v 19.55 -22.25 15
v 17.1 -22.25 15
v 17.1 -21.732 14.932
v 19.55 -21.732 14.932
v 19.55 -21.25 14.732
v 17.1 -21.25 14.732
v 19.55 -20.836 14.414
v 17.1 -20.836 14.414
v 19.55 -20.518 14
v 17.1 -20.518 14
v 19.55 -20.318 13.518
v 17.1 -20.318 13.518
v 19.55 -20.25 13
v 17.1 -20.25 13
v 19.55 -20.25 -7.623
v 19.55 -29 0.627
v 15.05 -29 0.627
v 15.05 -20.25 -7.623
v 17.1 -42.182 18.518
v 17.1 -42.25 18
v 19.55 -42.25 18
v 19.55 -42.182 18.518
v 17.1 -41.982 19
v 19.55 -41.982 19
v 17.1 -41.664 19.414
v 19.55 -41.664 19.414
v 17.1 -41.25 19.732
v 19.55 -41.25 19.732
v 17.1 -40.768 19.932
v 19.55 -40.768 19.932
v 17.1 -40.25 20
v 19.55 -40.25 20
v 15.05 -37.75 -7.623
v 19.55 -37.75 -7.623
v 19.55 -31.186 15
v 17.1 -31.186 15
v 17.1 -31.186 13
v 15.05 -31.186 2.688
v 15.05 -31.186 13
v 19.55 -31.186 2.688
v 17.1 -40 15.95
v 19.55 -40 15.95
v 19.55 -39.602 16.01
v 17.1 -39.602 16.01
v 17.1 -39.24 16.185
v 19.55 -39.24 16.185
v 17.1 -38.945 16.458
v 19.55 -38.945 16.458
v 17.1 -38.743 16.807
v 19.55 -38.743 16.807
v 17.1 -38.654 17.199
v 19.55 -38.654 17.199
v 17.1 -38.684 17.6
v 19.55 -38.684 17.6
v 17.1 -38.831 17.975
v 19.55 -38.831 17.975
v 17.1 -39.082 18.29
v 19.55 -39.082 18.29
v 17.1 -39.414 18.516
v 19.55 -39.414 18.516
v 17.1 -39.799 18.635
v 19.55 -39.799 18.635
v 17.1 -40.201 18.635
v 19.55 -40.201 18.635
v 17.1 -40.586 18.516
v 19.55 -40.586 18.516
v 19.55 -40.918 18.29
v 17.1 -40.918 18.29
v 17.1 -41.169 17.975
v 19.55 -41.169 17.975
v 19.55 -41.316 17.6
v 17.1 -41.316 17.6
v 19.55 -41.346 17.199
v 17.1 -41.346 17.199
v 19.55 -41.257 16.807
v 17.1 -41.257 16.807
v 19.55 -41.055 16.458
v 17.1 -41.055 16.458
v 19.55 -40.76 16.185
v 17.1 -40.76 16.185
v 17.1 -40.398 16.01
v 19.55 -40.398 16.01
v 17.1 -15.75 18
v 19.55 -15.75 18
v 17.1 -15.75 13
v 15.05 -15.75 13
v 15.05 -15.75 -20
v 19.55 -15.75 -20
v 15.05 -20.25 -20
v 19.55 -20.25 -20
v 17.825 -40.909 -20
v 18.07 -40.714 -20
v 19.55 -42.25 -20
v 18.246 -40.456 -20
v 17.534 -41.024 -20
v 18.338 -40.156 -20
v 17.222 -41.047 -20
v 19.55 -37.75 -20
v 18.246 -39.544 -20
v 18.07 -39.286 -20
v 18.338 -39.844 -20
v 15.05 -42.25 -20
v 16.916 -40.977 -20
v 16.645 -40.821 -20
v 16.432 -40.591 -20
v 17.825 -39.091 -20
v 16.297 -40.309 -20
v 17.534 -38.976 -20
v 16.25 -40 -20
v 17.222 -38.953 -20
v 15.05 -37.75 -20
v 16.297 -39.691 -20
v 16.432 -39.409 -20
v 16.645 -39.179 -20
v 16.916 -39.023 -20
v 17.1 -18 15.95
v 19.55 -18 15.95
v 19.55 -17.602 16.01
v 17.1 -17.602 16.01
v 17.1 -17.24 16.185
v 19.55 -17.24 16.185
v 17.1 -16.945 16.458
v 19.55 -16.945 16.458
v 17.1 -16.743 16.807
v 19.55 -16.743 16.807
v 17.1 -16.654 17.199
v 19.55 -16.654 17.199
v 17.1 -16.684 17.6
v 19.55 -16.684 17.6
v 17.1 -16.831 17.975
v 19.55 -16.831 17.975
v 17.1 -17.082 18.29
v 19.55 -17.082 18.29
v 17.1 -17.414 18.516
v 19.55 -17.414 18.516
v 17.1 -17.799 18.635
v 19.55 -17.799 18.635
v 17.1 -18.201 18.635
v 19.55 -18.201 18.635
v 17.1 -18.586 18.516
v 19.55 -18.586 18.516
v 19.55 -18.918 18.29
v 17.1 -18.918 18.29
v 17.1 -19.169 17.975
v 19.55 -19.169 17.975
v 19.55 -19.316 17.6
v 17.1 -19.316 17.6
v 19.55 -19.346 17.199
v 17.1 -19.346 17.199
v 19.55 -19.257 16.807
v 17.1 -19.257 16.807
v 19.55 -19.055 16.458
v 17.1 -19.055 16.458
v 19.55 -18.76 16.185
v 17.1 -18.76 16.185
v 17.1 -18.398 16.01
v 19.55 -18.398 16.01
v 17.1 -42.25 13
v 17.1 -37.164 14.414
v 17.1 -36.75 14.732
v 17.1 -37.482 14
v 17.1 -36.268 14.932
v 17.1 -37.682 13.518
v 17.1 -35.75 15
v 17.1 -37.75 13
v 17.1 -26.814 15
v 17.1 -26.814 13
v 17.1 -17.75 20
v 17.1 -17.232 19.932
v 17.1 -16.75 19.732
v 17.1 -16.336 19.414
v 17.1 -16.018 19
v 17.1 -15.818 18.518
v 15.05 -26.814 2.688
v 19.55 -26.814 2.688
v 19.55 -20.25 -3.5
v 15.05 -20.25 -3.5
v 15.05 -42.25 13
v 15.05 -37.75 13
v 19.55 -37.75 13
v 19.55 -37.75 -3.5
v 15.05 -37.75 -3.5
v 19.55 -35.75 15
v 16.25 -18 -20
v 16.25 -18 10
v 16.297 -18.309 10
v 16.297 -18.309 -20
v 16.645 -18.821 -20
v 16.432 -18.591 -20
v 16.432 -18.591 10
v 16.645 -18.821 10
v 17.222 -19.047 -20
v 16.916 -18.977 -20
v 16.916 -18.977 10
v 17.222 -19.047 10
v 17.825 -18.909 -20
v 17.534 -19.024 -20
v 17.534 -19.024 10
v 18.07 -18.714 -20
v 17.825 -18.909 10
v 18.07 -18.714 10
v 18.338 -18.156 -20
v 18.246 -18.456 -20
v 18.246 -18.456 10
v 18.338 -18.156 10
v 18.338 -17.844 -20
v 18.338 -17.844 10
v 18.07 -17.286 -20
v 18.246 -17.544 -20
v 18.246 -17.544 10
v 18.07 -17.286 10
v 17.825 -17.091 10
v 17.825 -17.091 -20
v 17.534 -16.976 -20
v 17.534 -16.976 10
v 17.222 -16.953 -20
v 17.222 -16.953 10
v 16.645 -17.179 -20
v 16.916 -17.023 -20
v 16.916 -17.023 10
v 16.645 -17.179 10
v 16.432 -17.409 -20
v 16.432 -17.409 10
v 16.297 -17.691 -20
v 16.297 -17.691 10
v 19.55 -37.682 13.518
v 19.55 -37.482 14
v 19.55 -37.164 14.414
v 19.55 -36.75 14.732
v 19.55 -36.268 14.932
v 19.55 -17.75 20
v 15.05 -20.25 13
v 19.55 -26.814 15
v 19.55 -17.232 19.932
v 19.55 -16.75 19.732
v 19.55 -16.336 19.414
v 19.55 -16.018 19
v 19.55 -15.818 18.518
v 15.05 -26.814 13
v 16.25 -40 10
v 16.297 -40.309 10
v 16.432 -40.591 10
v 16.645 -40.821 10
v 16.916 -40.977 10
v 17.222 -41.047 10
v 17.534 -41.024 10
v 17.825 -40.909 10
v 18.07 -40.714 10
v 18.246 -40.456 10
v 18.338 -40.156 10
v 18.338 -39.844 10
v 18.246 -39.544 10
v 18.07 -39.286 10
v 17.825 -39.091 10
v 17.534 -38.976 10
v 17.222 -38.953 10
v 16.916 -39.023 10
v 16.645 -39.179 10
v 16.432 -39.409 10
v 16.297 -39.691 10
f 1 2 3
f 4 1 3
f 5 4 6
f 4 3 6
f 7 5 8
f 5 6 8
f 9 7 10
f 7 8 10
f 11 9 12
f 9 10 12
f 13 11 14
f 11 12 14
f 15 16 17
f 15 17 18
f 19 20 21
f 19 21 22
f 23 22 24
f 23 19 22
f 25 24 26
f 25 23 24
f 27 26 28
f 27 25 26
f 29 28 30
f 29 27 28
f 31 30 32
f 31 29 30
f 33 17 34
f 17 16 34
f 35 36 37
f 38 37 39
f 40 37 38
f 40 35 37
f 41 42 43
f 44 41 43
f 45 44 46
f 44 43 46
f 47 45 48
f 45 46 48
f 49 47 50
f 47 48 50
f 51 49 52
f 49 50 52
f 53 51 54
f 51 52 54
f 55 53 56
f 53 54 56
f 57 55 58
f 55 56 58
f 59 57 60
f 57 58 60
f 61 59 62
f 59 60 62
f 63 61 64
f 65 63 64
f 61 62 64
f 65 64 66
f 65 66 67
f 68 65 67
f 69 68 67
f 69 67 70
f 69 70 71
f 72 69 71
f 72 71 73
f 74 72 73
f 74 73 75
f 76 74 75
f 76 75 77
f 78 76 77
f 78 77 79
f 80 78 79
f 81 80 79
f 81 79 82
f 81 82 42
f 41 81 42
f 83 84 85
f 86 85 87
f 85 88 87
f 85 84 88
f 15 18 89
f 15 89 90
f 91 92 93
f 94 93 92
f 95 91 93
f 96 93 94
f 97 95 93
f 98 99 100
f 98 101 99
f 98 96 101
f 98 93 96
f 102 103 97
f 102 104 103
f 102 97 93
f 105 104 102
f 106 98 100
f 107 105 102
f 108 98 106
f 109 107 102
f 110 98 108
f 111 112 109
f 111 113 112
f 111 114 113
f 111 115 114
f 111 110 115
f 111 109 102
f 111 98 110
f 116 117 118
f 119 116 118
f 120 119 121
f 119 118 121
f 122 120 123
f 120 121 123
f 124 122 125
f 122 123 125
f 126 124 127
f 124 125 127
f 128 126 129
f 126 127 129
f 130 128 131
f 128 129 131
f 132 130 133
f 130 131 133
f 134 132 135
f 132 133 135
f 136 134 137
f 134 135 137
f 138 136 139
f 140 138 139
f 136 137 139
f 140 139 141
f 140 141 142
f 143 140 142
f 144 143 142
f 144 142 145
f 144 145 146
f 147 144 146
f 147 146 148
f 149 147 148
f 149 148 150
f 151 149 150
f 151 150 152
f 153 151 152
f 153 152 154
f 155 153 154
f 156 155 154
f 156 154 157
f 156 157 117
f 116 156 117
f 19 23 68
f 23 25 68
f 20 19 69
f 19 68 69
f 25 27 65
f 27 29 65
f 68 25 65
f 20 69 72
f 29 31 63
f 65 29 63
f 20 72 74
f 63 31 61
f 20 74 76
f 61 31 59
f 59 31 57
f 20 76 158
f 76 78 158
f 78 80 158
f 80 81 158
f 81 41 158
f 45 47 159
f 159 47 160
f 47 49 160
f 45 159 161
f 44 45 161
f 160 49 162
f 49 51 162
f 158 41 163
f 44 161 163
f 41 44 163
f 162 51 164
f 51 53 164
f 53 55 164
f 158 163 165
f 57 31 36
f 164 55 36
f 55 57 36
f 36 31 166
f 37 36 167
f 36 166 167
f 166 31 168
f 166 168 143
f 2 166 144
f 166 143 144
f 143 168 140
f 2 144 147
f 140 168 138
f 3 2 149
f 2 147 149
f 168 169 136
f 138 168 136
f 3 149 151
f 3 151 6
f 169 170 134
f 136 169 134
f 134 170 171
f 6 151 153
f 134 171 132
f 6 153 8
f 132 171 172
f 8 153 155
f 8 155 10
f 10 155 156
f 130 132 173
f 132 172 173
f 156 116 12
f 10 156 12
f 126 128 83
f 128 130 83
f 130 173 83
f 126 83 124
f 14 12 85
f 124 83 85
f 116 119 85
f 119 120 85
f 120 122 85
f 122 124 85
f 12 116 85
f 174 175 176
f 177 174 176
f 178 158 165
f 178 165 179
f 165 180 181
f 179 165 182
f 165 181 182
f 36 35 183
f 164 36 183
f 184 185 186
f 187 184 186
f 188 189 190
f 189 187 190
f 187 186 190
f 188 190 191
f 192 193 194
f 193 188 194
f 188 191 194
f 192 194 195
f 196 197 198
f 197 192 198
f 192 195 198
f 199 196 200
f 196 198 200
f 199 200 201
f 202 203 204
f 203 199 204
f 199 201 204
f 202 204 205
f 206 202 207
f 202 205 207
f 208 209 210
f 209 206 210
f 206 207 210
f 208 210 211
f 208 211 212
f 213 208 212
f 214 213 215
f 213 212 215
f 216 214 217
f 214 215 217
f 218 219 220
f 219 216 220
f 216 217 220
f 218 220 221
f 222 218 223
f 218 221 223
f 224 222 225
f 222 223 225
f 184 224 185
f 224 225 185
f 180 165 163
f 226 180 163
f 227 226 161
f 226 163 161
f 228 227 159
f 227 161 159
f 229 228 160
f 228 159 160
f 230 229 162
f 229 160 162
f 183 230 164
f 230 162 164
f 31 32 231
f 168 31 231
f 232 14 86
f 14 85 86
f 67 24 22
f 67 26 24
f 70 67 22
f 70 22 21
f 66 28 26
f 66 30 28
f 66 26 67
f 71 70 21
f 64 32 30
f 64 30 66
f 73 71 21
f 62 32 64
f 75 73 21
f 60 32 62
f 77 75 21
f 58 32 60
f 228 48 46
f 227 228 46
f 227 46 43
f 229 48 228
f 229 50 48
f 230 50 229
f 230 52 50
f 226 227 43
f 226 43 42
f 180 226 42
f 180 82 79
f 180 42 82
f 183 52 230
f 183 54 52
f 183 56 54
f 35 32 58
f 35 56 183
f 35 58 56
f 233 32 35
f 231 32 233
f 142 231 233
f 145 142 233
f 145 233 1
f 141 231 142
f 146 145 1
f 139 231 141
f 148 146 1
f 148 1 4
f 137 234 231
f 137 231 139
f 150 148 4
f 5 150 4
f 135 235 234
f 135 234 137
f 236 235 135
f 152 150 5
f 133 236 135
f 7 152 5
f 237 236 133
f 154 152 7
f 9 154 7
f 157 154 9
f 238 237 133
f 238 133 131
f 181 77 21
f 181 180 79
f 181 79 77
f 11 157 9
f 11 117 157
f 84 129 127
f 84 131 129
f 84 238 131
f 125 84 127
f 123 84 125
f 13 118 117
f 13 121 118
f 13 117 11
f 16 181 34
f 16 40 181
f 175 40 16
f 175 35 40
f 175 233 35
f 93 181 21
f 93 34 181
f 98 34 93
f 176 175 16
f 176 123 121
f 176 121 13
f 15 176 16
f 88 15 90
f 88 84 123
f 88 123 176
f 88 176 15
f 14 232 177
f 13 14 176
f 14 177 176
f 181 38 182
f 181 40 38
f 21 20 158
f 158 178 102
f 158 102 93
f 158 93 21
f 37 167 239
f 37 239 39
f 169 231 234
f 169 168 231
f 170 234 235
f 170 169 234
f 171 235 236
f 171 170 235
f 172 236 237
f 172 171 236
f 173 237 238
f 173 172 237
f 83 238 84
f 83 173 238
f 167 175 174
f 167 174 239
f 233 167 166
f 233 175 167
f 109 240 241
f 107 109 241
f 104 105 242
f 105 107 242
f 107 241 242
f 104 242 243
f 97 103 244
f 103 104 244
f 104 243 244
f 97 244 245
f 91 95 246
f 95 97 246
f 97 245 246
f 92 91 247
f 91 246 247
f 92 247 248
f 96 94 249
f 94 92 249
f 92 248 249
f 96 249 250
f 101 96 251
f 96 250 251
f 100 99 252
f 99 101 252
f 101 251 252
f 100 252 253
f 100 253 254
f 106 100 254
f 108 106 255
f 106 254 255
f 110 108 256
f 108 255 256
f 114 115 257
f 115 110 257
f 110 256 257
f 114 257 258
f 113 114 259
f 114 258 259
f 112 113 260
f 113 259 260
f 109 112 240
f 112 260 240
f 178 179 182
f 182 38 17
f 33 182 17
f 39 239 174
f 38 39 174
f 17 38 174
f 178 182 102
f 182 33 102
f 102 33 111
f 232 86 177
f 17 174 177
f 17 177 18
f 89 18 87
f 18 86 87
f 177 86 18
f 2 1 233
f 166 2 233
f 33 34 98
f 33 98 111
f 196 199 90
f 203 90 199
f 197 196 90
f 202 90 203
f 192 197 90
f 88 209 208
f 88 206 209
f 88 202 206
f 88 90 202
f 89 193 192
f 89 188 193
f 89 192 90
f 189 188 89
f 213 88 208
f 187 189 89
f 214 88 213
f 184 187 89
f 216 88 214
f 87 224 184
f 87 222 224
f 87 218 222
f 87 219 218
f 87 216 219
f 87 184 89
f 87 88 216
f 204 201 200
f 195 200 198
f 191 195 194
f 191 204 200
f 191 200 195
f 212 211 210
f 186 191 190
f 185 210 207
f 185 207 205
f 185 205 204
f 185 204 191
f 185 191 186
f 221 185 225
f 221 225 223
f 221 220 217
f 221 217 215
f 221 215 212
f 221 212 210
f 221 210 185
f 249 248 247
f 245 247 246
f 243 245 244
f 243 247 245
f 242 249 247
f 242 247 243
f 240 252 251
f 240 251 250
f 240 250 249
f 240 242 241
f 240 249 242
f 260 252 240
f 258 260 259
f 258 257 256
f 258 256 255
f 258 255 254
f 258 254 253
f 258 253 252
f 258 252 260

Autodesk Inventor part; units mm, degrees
ref_plane "YZ Plane" through (0, 0, 0) normal (1, 0, 0) x (0, 1, 0)
ref_plane "XZ Plane" through (0, 0, 0) normal (0, 1, 0) x (-1, 0, 0)
ref_plane "XY Plane" through (0, 0, 0) normal (0, 0, 1) x (1, 0, 0)
ref_plane "작업 평면1" through (-20.6428, -10.415, 0) normal (0, 0, 1) x (1, 0, 0)
sketch "스케치1" plane through (-20.6428, -10.415, 0) normal (0, 0, 1) x (1, 0, 0)
  arc A0 (40.7428, 14.9916) -> (40.2236, 16.6785) centre (37.7428, 14.9916) ccw projected
  line L0 (40.2236, 16.6785) -> (36.2381, 22.5396) projected
  arc A1 (36.2381, 22.5396) -> (34.5842, 23.415) centre (34.5842, 21.415) ccw projected
  line L1 (33.6428, 23.415) -> (34.5842, 23.415) projected
  arc A2 (35.1428, 21.915) -> (33.6428, 23.415) centre (33.6428, 21.915) ccw projected
  line L2 (35.1428, -31.085) -> (35.1428, 21.915) projected
  arc A3 (34.1428, -32.085) -> (35.1428, -31.085) centre (34.1428, -31.085) ccw projected
  line L3 (7.1428, -32.085) -> (34.1428, -32.085) projected
  arc A4 (6.1428, -31.085) -> (7.1428, -32.085) centre (7.1428, -31.085) ccw projected
  line L4 (6.1428, 21.915) -> (6.1428, -31.085) projected
  arc A5 (7.6428, 23.415) -> (6.1428, 21.915) centre (7.6428, 21.915) ccw projected
  line L5 (6.7014, 23.415) -> (7.6428, 23.415) projected
  arc A6 (6.7014, 23.415) -> (5.0476, 22.5396) centre (6.7014, 21.415) ccw projected
  line L6 (5.0476, 22.5396) -> (1.0621, 16.6785) projected
  arc A7 (1.0621, 16.6785) -> (0.5428, 14.9916) centre (3.5428, 14.9916) ccw projected
  line L7 (0.5428, 14.9916) -> (0.5428, -29.2617) projected
  arc A8 (0.5428, -29.2617) -> (1.0621, -30.9486) centre (3.5428, -29.2617) ccw projected
  line L8 (1.0621, -30.9486) -> (4.7499, -36.372) projected
  arc A9 (4.7499, -36.372) -> (7.2307, -37.685) centre (7.2307, -34.685) ccw projected
  line L9 (7.2307, -37.685) -> (34.0549, -37.685) projected
  arc A10 (34.0549, -37.685) -> (36.5357, -36.372) centre (34.0549, -34.685) ccw projected
  line L10 (36.5357, -36.372) -> (40.2236, -30.9486) projected
  arc A11 (40.2236, -30.9486) -> (40.7428, -29.2617) centre (37.7428, -29.2617) ccw projected
  line L11 (40.7428, -29.2617) -> (40.7428, 14.9916) projected
  circle A12 centre (3.3428, 14.415) radius 1.35 projected
  circle A13 centre (3.3428, -7.585) radius 1.35 projected
  circle A14 centre (9.6428, -34.885) radius 1.35 projected
  circle A15 centre (37.9428, 14.415) radius 1.35 projected
  circle A16 centre (37.9428, -7.585) radius 1.35 projected
  circle A17 centre (31.6428, -34.885) radius 1.35 projected
  circle A18 centre (3.3428, -29.585) radius 1.35 projected
  circle A19 centre (37.9428, -29.585) radius 1.35 projected
  line L12 (35.6928, -9.835) -> (40.1928, -9.835)
  line L13 (40.1928, -9.835) -> (40.1928, -5.335)
  line L14 (40.1928, -5.335) -> (35.6928, -5.335)
  line L15 (35.6928, -5.335) -> (35.6928, -9.835)
  line L16 (35.6928, -9.835) -> (40.1928, -5.335) construction
  line L17 (40.1928, -9.835) -> (35.6928, -5.335) construction
  line L18 (35.6928, -31.835) -> (40.1928, -31.835)
  line L19 (40.1928, -31.835) -> (40.1928, -27.335)
  line L20 (40.1928, -27.335) -> (35.6928, -27.335)
  line L21 (35.6928, -27.335) -> (35.6928, -31.835)
  line L22 (35.6928, -31.835) -> (40.1928, -27.335) construction
  line L23 (40.1928, -31.835) -> (35.6928, -27.335) construction
  point P0 (20.6428, 10.415)
  dimension "d0" = 4.5
  dimension "d1" = 4.5
  dimension "d2" = 4.5
  dimension "d3" = 4.5
extrude "돌출1" add sketch "스케치1" along normal blind 20 contours L19 L18 L10 | L10 L18 L21 L20 L19 | A16 | A19 | L15 L14 L13 L12
sketch "스케치2" plane through (19.55, -42.25, 0) normal (1, 0, 0) x (0, 0, -1)
  line L0 (0, 0) -> (0, 4.5) projected
  line L1 (0, 4.5) -> (-20, 4.5) projected
  line L2 (-20, 0) -> (-20, 4.5) projected
  line L3 (0, 0) -> (-20, 0) projected
  line L4 (0, 22) -> (0, 26.5) projected
  line L5 (0, 26.5) -> (-20, 26.5) projected
  line L6 (-20, 22) -> (-20, 26.5) projected
  line L7 (0, 22) -> (-20, 22) projected
  line L8 (-20, 0) -> (-20, 26.5)
  line L9 (-20, 26.5) -> (-15, 26.5)
  line L10 (-15, 26.5) -> (-15, 0)
  line L11 (-15, 0) -> (-20, 0)
  point P0 (0, 42.25)
  point P1 (-15, 4.5)
  point P2 (-15, 22)
  point P3 (-20, 22)
  point P4 (-20, 4.5)
  dimension "d6" = 5
extrude "돌출2" add sketch "스케치2" against normal up to surface (4.5 mm away) contours L1 L8 L7 L10
fillet "모깎기1" radius 2 2 edges at (17.3, -20.25, 15) (17.3, -37.75, 15)
fillet "모깎기2" radius 2 2 edges at (17.3, -42.25, 20) (17.3, -15.75, 20)
sketch "스케치3" plane through (-20.6428, -10.415, 0) normal (0, 0, -1) x (-1, 0, 0)
  circle A0 centre (-37.9428, -29.585) radius 1.35 projected
  circle A1 centre (-37.9428, -7.585) radius 1.35 projected
  circle A2 centre (-37.9428, -29.585) radius 1.05
  circle A3 centre (-37.9428, -7.585) radius 1.05
  point P0 (-20.6428, 10.415)
  dimension "d11" = 2.1
  dimension "d12" = 2.1
extrude "돌출3" cut sketch "스케치3" against normal blind 10 contours A2 | A3
sketch "스케치4" plane through (15.05, -15.75, 0) normal (0, 1, 0) x (1, 0, 0)
  line L0 (4.5, -18) -> (0, -18) projected
  line L1 (-30.1, -18) -> (-34.6, -18)
  line L2 (0, 0) -> (0, -18) projected
  line L3 (0, -18) -> (-30.1, -18)
  line L4 (2.05, -13) -> (-32.15, -13)
  line L5 (-32.15, -13) -> (-32.15, -23)
  line L6 (-32.15, -23) -> (2.05, -23)
  line L7 (2.05, -23) -> (2.05, -13)
  line L8 (2.05, -13) -> (-32.15, -23) construction
  line L9 (-32.15, -13) -> (2.05, -23) construction
  point P0 (-15.05, 0)
  point P1 (-15.05, -18)
  dimension "d15" = 34.2
  dimension "d16" = 10
extrude "돌출4" cut sketch "스케치4" against normal up to surface (26.5 mm away)
sketch "스케치5" plane through (19.55, -42.25, 0) normal (1, 0, 0) x (0, 0, -1)
  circle A0 centre (-17.3, 2.25) radius 1.35
  circle A1 centre (-17.3, 24.25) radius 1.35
  point P0 (0, 42.25)
extrude "돌출5" cut sketch "스케치5" against normal through all
sketch "스케치6" plane through (-20.6428, -10.415, 0) normal (0, 0, -1) x (-1, 0, 0)
  circle A0 centre (-37.9428, -29.585) radius 1.05 projected
  line L0 (-35.6928, -31.835) -> (-40.1928, -31.835) projected
  line L1 (-35.6928, -27.335) -> (-35.6928, -31.835) projected
  line L2 (-40.1928, -27.335) -> (-35.6928, -27.335) projected
  line L3 (-40.1928, -31.835) -> (-40.1928, -27.335) projected
  circle A1 centre (-37.9428, -7.585) radius 1.05 projected
  line L4 (-40.1928, -9.835) -> (-40.1928, -5.335) projected
  line L5 (-35.6928, -9.835) -> (-40.1928, -9.835) projected
  line L6 (-35.6928, -5.335) -> (-35.6928, -9.835) projected
  line L7 (-40.1928, -5.335) -> (-35.6928, -5.335) projected
  point P0 (-20.6428, 10.415)
extrude "돌출6" add sketch "스케치6" along normal blind 20
sketch "스케치7" plane through (19.55, -35.75, 15) normal (1, 0, 0) x (0, 0, -1)
  circle A0 centre (-2.3, 17.75) radius 1.35 projected
  circle A1 centre (-2.3, -4.25) radius 1.35 projected
  arc A2 (-3, 20) -> (-5, 18) centre (-3, 18) ccw projected
  line L0 (-5, -4.5) -> (-5, 18) projected
  arc A3 (-5, -4.5) -> (-3, -6.5) centre (-3, -4.5) ccw projected
  line L1 (35, -6.5) -> (-3, -6.5) projected
  line L2 (35, -2) -> (35, -6.5) projected
  line L3 (35, -2) -> (2, -2) projected
  arc A4 (0, 0) -> (2, -2) centre (2, 0) ccw projected
  line L4 (0, 0) -> (0, 13.5) projected
  arc A5 (2, 15.5) -> (0, 13.5) centre (2, 13.5) ccw projected
  line L5 (2, 15.5) -> (35, 15.5) projected
  line L6 (35, 20) -> (35, 15.5) projected
  line L7 (35, 20) -> (-3, 20) projected
  circle A6 centre (-2.3, 17.75) radius 1.35 projected
  circle A7 centre (-2.3, -4.25) radius 1.35 projected
  arc A8 (0, 0) -> (2, -2) centre (2, 0) ccw projected
  line L8 (2, -2) -> (2, -6.5) projected
  line L9 (-3, -6.5) -> (2, -6.5) projected
  arc A9 (-5, -4.5) -> (-3, -6.5) centre (-3, -4.5) ccw projected
  line L10 (-5, 18) -> (-5, -4.5) projected
  arc A10 (-3, 20) -> (-5, 18) centre (-3, 18) ccw projected
  line L11 (2, 20) -> (-3, 20) projected
  line L12 (2, 20) -> (2, 15.5) projected
  arc A11 (2, 15.5) -> (0, 13.5) centre (2, 13.5) ccw projected
  line L13 (0, 0) -> (0, 13.5) projected
  line L14 (2, -2) -> (18.5, 15.5)
  line L15 (6.1232, -2) -> (22.6232, 15.5)
  line L16 (2, 15.5) -> (18.5, -2)
  line L17 (6.1232, 15.5) -> (22.6232, -2)
  line L18 (12.3116, 4.5635) -> (12.3116, 8.9365)
  line L19 (12.3116, 8.9365) -> (0, 8.9365)
  line L20 (0, 8.9365) -> (0, 4.5635)
  line L21 (0, 4.5635) -> (12.3116, 4.5635)
  point P0 (15, 35.75)
  point P1 (14.3732, 6.75)
  point P2 (0, 8.9365)
  dimension "d23" = 3
  dimension "d24" = 3
extrude "돌출7" add sketch "스케치7" against normal up to surface (4.5 mm away) contours L19 L14 L16 | L16 L14 L21 L4 L19 | L15 L17 L14 L5 | L18 L16 L14 | L17 L15 L18 | L16 L21 L14 | L17 L3 L16 L15
sketch "스케치8" plane through (17.1, -15.75, 13) normal (-1, 0, 0) x (0, 0, 1)
  circle A0 centre (4.3, -2.25) radius 1.35 projected
  circle A1 centre (4.3, -24.25) radius 1.35 projected
  arc A2 (0, -22) -> (2, -20) centre (0, -20) ccw projected
  line L0 (0, -22) -> (0, -26.5) projected
  line L1 (5, -26.5) -> (0, -26.5) projected
  arc A3 (5, -26.5) -> (7, -24.5) centre (5, -24.5) ccw projected
  line L2 (7, -2) -> (7, -24.5) projected
  arc A4 (7, -2) -> (5, 0) centre (5, -2) ccw projected
  line L3 (0, 0) -> (5, 0) projected
  line L4 (0, 0) -> (0, -4.5) projected
  arc A5 (2, -6.5) -> (0, -4.5) centre (0, -6.5) ccw projected
  line L5 (2, -11.0635) -> (2, -6.5) projected
  line L6 (2, -15.4365) -> (2, -11.0635) projected
  line L7 (2, -20) -> (2, -15.4365) projected
  line L8 (0, -26.5) -> (0, -22) projected
  line L9 (-16.5, -22) -> (0, -22) projected
  line L10 (-10.3116, -15.4365) -> (-16.5, -22) projected
  line L11 (2, -15.4365) -> (-10.3116, -15.4365) projected
  line L12 (2, -11.0635) -> (2, -15.4365) projected
  line L13 (-10.3116, -11.0635) -> (2, -11.0635) projected
  line L14 (-16.5, -4.5) -> (-10.3116, -11.0635) projected
  line L15 (-16.5, -4.5) -> (0, -4.5) projected
  line L16 (0, -4.5) -> (0, 0) projected
  line L17 (-33, 0) -> (0, 0) projected
  line L18 (-33, -4.5) -> (-33, 0) projected
  line L19 (-33, -4.5) -> (-20.6232, -4.5) projected
  line L20 (-12.3732, -13.25) -> (-20.6232, -4.5) projected
  line L21 (-20.6232, -22) -> (-12.3732, -13.25) projected
  line L22 (-33, -22) -> (-20.6232, -22) projected
  line L23 (-33, -26.5) -> (-33, -22) projected
  line L24 (0, -26.5) -> (-33, -26.5) projected
  line L25 (-16.5, -4.5) -> (0, -4.5) projected
  line L26 (0, -4.5) -> (0, -22)
  point P0 (-13, 15.75)
  point P1 (0, -11.0635)
  point P2 (0, -15.4365)
extrude "돌출8" cut sketch "스케치8" along normal up to surface (2.05 mm away) contours L26 L13 L6 L11
properties part number "106_64_Connector" material "알루미늄 6061"
